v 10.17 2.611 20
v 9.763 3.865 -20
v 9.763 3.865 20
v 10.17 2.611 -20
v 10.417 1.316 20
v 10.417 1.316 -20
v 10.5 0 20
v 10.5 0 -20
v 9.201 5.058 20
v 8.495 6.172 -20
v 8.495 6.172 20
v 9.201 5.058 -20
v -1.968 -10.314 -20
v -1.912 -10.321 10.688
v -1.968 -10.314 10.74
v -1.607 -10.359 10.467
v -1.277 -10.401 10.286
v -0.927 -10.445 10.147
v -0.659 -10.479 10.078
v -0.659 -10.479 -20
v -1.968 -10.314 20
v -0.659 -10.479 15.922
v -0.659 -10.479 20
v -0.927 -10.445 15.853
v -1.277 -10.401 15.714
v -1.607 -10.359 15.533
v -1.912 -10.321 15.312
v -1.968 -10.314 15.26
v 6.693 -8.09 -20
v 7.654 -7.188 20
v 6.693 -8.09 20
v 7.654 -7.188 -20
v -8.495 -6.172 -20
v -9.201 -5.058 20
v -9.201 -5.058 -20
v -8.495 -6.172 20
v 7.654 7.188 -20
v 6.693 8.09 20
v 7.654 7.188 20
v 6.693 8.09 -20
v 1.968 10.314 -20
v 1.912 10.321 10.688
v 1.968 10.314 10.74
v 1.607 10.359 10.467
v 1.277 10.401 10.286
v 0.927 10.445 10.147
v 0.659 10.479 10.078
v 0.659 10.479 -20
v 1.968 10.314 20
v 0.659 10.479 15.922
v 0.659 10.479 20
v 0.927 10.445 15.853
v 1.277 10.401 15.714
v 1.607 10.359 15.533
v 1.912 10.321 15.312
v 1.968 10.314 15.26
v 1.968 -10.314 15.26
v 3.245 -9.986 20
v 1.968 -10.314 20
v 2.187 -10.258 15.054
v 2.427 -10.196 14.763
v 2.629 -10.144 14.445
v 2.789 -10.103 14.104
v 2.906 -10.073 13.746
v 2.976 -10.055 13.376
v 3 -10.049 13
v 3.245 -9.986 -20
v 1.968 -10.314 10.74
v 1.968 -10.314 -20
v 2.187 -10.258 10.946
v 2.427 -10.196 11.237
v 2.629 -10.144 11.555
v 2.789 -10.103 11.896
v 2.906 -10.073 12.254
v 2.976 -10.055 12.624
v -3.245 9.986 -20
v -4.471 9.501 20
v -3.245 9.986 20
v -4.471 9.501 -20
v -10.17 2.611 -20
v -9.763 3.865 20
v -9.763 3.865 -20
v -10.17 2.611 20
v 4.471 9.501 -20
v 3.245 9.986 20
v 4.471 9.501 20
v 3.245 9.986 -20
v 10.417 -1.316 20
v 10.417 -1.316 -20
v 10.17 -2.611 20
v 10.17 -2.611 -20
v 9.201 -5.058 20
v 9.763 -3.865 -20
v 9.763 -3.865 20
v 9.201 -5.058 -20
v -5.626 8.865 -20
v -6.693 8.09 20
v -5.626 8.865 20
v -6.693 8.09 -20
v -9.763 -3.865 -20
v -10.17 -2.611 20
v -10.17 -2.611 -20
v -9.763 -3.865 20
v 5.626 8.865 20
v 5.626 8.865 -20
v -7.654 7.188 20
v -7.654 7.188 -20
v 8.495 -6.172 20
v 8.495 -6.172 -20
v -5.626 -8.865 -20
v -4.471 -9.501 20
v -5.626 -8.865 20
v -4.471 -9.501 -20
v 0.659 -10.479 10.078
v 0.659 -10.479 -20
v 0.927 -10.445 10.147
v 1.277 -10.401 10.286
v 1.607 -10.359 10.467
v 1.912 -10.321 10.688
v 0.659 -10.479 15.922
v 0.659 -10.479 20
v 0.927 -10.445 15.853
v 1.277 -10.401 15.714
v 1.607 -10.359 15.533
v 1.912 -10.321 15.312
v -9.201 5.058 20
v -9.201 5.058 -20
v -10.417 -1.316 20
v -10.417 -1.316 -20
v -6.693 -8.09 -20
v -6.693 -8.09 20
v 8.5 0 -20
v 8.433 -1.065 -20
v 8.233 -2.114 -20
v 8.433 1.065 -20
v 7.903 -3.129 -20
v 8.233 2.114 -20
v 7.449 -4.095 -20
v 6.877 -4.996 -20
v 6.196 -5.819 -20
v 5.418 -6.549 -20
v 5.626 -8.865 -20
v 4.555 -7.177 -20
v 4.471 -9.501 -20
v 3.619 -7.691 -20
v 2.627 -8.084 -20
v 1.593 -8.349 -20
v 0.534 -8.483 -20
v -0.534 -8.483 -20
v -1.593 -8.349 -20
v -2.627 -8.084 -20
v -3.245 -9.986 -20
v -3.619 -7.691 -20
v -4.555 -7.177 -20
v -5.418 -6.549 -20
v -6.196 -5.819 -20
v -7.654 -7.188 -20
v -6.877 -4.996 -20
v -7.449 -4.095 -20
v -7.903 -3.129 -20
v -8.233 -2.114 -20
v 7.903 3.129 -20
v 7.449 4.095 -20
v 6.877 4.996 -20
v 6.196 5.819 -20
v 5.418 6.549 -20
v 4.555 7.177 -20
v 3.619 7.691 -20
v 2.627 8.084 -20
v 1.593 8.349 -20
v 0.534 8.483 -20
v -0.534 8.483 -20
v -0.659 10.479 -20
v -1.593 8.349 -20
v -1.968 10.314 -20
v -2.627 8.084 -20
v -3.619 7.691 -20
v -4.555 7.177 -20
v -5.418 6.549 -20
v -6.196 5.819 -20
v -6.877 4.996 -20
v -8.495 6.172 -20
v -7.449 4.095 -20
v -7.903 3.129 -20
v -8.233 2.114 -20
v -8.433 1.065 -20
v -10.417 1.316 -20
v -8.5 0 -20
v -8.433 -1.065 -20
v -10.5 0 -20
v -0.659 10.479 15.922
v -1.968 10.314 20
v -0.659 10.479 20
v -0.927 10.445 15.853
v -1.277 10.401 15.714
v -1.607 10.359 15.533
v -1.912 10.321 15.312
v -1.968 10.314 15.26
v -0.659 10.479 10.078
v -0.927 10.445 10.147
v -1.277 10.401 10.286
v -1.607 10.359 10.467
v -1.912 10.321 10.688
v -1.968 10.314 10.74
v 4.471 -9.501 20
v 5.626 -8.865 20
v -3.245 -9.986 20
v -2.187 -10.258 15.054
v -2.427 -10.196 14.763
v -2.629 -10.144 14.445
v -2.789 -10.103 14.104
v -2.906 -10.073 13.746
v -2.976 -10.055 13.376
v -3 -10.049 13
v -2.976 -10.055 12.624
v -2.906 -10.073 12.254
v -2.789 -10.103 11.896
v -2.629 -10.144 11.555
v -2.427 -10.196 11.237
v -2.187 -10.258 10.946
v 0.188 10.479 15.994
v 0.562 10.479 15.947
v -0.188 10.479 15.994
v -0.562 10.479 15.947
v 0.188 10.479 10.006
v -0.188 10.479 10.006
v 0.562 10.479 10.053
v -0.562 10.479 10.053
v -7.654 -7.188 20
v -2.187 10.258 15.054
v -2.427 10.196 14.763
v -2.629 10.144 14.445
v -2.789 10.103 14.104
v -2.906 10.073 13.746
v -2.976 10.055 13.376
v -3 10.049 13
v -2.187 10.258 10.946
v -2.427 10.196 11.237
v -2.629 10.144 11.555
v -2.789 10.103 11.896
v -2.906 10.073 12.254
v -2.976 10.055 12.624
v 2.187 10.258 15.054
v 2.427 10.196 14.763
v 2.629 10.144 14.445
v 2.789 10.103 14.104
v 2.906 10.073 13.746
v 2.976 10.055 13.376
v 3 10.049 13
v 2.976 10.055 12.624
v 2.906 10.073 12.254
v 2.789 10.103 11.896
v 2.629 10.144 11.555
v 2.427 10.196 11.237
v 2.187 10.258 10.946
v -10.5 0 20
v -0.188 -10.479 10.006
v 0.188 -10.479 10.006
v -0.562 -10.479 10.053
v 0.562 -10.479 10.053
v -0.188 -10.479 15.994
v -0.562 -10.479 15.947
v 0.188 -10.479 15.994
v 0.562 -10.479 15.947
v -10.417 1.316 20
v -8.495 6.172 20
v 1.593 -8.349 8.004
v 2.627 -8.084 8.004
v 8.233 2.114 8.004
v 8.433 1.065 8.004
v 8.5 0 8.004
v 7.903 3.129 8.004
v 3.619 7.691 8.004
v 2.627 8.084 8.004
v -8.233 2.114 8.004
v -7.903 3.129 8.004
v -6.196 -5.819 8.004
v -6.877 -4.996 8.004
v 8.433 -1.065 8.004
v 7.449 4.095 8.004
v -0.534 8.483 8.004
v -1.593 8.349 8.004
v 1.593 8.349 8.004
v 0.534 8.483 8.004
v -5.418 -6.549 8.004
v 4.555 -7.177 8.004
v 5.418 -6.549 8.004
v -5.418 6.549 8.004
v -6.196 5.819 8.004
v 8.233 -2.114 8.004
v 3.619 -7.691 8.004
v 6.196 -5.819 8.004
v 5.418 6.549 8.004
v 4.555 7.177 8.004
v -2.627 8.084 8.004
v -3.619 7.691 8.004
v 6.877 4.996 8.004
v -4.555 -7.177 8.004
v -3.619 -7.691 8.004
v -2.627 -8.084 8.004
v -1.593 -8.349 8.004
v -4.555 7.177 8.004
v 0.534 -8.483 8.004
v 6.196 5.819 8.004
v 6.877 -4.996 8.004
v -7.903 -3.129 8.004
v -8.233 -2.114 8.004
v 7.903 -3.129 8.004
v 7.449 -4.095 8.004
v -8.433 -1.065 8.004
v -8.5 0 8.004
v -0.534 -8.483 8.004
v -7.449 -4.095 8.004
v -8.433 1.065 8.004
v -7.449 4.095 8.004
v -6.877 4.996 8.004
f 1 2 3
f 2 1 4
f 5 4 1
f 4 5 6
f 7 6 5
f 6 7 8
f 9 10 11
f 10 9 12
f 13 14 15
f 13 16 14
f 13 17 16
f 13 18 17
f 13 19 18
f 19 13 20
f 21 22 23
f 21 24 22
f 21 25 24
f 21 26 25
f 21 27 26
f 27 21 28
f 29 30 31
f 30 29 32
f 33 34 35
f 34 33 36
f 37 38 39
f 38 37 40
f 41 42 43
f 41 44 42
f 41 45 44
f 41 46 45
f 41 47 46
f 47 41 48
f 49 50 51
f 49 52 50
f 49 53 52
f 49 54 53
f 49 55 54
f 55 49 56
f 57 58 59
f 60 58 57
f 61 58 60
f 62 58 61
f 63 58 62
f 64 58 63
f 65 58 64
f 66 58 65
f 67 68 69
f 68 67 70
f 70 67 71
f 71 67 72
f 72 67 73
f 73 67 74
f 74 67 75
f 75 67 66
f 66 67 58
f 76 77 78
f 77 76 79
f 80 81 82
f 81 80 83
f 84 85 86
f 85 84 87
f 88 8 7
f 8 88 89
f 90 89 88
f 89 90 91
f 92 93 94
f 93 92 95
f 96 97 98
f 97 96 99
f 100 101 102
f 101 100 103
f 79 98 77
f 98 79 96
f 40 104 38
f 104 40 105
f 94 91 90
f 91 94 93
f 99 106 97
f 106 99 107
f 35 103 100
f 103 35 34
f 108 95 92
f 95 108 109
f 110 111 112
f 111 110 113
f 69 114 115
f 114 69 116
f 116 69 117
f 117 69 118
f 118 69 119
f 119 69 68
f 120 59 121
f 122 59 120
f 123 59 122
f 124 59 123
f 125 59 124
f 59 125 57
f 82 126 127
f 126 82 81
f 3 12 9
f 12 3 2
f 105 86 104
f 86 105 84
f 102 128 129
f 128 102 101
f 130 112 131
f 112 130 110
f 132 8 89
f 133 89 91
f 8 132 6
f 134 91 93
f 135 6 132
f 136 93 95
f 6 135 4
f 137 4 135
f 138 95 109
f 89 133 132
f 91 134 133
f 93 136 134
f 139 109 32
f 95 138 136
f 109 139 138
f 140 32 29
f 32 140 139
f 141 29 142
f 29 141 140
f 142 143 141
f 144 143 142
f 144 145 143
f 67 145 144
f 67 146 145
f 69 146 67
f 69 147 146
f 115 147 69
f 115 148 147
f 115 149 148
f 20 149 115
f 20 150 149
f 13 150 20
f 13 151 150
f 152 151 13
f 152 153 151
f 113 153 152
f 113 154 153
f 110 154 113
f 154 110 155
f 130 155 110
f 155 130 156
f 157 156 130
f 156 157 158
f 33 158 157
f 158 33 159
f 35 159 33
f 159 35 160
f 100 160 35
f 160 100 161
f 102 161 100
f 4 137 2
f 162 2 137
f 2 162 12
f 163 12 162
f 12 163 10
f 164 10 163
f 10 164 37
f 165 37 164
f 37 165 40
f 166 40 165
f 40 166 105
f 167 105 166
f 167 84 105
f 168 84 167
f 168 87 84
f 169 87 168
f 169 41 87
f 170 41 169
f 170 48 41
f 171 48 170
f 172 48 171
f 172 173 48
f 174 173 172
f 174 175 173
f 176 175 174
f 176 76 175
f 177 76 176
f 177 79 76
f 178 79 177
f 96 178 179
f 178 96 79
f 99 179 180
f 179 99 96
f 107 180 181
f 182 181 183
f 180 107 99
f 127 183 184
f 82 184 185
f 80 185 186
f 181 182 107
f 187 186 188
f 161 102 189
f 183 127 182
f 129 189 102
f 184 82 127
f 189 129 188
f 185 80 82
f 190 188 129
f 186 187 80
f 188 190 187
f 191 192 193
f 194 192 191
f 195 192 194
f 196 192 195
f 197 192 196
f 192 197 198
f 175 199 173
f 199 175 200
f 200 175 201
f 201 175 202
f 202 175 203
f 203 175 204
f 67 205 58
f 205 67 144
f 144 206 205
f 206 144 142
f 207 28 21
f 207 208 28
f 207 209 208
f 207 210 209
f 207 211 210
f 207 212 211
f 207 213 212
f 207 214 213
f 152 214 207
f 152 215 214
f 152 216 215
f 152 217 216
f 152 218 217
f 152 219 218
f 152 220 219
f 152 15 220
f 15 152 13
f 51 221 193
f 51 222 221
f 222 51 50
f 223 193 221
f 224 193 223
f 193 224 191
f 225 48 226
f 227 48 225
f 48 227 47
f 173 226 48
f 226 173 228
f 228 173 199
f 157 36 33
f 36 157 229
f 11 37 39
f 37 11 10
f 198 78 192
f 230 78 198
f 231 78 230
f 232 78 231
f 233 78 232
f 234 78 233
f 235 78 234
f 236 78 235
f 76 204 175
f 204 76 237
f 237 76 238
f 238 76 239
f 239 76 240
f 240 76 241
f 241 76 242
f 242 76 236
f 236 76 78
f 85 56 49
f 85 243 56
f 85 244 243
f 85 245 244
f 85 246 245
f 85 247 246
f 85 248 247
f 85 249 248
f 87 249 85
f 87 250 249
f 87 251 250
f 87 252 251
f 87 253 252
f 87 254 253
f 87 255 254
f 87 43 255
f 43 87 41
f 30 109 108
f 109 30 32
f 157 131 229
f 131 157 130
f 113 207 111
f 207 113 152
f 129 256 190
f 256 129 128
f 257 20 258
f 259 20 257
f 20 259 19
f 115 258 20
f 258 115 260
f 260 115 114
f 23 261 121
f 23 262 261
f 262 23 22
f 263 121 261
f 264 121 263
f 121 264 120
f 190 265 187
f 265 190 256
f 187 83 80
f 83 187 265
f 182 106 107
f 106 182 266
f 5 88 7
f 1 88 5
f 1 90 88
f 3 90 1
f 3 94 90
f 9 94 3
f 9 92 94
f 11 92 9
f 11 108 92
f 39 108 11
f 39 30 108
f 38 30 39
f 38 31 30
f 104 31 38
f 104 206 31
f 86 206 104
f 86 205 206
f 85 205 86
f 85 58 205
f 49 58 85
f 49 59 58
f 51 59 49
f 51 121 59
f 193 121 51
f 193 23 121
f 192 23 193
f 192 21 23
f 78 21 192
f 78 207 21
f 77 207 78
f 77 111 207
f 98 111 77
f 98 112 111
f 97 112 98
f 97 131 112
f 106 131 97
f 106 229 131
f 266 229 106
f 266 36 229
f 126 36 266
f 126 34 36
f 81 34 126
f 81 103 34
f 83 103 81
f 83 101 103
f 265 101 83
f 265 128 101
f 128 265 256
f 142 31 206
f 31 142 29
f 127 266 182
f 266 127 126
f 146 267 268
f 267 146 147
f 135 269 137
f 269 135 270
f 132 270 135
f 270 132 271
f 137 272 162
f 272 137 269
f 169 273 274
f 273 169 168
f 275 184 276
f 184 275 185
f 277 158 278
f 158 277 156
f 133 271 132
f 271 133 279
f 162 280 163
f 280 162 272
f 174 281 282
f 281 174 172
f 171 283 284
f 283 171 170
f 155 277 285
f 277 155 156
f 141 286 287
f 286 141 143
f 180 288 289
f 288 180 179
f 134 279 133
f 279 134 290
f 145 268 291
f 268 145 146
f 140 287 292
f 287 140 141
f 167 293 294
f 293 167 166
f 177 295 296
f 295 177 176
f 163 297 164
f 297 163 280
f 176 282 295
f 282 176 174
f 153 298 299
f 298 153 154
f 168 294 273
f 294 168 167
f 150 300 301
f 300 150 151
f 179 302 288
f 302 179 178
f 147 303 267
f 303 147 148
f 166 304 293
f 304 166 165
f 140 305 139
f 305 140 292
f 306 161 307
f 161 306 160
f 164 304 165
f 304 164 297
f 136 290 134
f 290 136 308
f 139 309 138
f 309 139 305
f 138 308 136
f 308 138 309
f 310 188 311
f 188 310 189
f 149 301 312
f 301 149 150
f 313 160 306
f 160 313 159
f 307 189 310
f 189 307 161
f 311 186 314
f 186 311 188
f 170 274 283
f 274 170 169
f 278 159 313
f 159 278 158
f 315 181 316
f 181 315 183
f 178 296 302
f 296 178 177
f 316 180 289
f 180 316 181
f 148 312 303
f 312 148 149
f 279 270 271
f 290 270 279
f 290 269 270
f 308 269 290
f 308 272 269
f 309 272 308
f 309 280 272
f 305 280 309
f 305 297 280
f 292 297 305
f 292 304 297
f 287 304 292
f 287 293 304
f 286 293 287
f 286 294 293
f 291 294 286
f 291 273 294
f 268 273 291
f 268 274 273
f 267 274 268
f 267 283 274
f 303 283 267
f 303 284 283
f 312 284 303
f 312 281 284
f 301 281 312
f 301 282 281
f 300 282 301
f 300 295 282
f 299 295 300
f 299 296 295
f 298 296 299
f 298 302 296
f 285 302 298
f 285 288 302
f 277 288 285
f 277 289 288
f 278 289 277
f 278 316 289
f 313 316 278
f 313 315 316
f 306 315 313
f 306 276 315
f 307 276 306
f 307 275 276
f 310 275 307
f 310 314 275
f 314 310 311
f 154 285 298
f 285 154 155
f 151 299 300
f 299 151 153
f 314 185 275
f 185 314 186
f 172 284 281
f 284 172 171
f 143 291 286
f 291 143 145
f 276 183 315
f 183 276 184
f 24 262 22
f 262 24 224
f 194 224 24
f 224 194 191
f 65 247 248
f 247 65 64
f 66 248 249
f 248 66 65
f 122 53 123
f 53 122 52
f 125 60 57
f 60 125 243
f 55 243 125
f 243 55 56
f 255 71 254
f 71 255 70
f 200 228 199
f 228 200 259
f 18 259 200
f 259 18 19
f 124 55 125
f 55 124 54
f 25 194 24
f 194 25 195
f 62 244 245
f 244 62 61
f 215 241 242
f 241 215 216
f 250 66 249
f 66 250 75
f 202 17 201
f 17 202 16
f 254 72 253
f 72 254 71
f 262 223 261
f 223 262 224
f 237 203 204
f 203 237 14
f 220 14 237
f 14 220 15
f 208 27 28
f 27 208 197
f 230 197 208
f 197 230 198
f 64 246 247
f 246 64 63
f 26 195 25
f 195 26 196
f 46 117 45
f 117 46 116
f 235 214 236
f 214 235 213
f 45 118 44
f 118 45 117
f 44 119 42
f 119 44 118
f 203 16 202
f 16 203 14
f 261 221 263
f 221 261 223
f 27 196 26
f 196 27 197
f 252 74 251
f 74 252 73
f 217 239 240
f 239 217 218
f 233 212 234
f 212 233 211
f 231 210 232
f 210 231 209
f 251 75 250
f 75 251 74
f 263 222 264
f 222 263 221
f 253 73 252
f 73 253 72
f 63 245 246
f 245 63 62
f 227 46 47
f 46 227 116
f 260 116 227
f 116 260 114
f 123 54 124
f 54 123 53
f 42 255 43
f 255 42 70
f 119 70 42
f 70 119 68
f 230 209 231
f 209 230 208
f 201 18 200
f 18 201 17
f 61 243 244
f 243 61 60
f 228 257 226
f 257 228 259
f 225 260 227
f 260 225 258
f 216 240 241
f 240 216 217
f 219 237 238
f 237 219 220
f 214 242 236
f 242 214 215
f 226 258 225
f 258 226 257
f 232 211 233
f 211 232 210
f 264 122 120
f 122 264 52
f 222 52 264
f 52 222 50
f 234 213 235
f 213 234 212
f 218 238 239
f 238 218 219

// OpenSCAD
$fn=50; 
/* Generic pipe / washer family used for simulating a cylinder with a inner cylindrical cavity. */
module CYLX0006_PIP(length, outer_radius, inner_radius)
{
    difference()
    {
        cylinder(h = length, r1 = outer_radius, r2 = outer_radius, center = true);
        cylinder(h = length+0.01, r1 = inner_radius, r2 = inner_radius, center = true);
    }
}


module CYLX0006_COUP(inner_shaft_radius_a, outer_shaft_radius_a, inner_shaft_depth_a, inner_shaft_radius_b, outer_shaft_radius_b, inner_shaft_depth_b, intershaft_separation_length)
{
    translate([0,0,inner_shaft_depth_a/2])
    {
        // Shaft A
        difference()
        {
            cylinder(h = inner_shaft_depth_a, r1 = outer_shaft_radius_a, r2 = outer_shaft_radius_a, center = true);
            cylinder(h = inner_shaft_depth_a+0.01, r1 = inner_shaft_radius_a, r2 = inner_shaft_radius_a, center = true);
        }
    }
    
    translate([0,0,inner_shaft_depth_a+intershaft_separation_length/2])
    {
        // Intershaft Separation Cone
        difference()
        {
            cylinder(h = intershaft_separation_length, r1 = outer_shaft_radius_a, r2 = outer_shaft_radius_b, center = true);
            cylinder(h = intershaft_separation_length+0.01, r1 = inner_shaft_radius_a - (outer_shaft_radius_a-inner_shaft_radius_a)/3, r2 = inner_shaft_radius_b - (outer_shaft_radius_b-inner_shaft_radius_b)/3, center = true);
        }
    }
    
    
    // Shaft B
    translate([0,0,inner_shaft_depth_a+intershaft_separation_length+inner_shaft_depth_b/2])
    {
        difference()
        {
            cylinder(h = inner_shaft_depth_b, r1 = outer_shaft_radius_b, r2 = outer_shaft_radius_b, center = true);
            cylinder(h = inner_shaft_depth_b+0.01, r1 = inner_shaft_radius_b, r2 = inner_shaft_radius_b, center = true);
        }
    }
    // Intershaft Cone

}

// Hole Cap : A Shaft cape with a hold to put things through.
module CYLX0006_HCAP(outer_cap_length, inner_cap_length, inner_cap_radius, outer_cap_radius, hole_radius, hole_center_distance_from_top)
{
    difference()
    {
        cylinder(h = outer_cap_length, r1 = outer_cap_radius, r2 = outer_cap_radius, center = true);
        translate([0,0,-((outer_cap_length-inner_cap_length)/2+0.001)])
        {
            cylinder(h = inner_cap_length+0.01, r1 = inner_cap_radius, r2 = inner_cap_radius, center = true);
        }
        translate([0,0,outer_cap_length/2-hole_center_distance_from_top])
        {
            rotate([90,0,0])
            {
                cylinder(h = 2*outer_cap_radius+0.01, r1 = hole_radius, r2 = hole_radius, center = true);
            }
        }
    }
}

CYLX0006_HCAP(outer_cap_length=40, inner_cap_length=28, inner_cap_radius=8.5, outer_cap_radius=10.5, outer_shaft_radius=10, hole_radius=3, hole_center_distance_from_top = 7);

//CYLX0006_COUP(inner_shaft_radius_a=10.0, outer_shaft_radius_a=12.5, inner_shaft_depth_a=50, inner_shaft_radius_b=30, outer_shaft_radius_b=50, inner_shaft_depth_b=50, intershaft_separation_length=100);
